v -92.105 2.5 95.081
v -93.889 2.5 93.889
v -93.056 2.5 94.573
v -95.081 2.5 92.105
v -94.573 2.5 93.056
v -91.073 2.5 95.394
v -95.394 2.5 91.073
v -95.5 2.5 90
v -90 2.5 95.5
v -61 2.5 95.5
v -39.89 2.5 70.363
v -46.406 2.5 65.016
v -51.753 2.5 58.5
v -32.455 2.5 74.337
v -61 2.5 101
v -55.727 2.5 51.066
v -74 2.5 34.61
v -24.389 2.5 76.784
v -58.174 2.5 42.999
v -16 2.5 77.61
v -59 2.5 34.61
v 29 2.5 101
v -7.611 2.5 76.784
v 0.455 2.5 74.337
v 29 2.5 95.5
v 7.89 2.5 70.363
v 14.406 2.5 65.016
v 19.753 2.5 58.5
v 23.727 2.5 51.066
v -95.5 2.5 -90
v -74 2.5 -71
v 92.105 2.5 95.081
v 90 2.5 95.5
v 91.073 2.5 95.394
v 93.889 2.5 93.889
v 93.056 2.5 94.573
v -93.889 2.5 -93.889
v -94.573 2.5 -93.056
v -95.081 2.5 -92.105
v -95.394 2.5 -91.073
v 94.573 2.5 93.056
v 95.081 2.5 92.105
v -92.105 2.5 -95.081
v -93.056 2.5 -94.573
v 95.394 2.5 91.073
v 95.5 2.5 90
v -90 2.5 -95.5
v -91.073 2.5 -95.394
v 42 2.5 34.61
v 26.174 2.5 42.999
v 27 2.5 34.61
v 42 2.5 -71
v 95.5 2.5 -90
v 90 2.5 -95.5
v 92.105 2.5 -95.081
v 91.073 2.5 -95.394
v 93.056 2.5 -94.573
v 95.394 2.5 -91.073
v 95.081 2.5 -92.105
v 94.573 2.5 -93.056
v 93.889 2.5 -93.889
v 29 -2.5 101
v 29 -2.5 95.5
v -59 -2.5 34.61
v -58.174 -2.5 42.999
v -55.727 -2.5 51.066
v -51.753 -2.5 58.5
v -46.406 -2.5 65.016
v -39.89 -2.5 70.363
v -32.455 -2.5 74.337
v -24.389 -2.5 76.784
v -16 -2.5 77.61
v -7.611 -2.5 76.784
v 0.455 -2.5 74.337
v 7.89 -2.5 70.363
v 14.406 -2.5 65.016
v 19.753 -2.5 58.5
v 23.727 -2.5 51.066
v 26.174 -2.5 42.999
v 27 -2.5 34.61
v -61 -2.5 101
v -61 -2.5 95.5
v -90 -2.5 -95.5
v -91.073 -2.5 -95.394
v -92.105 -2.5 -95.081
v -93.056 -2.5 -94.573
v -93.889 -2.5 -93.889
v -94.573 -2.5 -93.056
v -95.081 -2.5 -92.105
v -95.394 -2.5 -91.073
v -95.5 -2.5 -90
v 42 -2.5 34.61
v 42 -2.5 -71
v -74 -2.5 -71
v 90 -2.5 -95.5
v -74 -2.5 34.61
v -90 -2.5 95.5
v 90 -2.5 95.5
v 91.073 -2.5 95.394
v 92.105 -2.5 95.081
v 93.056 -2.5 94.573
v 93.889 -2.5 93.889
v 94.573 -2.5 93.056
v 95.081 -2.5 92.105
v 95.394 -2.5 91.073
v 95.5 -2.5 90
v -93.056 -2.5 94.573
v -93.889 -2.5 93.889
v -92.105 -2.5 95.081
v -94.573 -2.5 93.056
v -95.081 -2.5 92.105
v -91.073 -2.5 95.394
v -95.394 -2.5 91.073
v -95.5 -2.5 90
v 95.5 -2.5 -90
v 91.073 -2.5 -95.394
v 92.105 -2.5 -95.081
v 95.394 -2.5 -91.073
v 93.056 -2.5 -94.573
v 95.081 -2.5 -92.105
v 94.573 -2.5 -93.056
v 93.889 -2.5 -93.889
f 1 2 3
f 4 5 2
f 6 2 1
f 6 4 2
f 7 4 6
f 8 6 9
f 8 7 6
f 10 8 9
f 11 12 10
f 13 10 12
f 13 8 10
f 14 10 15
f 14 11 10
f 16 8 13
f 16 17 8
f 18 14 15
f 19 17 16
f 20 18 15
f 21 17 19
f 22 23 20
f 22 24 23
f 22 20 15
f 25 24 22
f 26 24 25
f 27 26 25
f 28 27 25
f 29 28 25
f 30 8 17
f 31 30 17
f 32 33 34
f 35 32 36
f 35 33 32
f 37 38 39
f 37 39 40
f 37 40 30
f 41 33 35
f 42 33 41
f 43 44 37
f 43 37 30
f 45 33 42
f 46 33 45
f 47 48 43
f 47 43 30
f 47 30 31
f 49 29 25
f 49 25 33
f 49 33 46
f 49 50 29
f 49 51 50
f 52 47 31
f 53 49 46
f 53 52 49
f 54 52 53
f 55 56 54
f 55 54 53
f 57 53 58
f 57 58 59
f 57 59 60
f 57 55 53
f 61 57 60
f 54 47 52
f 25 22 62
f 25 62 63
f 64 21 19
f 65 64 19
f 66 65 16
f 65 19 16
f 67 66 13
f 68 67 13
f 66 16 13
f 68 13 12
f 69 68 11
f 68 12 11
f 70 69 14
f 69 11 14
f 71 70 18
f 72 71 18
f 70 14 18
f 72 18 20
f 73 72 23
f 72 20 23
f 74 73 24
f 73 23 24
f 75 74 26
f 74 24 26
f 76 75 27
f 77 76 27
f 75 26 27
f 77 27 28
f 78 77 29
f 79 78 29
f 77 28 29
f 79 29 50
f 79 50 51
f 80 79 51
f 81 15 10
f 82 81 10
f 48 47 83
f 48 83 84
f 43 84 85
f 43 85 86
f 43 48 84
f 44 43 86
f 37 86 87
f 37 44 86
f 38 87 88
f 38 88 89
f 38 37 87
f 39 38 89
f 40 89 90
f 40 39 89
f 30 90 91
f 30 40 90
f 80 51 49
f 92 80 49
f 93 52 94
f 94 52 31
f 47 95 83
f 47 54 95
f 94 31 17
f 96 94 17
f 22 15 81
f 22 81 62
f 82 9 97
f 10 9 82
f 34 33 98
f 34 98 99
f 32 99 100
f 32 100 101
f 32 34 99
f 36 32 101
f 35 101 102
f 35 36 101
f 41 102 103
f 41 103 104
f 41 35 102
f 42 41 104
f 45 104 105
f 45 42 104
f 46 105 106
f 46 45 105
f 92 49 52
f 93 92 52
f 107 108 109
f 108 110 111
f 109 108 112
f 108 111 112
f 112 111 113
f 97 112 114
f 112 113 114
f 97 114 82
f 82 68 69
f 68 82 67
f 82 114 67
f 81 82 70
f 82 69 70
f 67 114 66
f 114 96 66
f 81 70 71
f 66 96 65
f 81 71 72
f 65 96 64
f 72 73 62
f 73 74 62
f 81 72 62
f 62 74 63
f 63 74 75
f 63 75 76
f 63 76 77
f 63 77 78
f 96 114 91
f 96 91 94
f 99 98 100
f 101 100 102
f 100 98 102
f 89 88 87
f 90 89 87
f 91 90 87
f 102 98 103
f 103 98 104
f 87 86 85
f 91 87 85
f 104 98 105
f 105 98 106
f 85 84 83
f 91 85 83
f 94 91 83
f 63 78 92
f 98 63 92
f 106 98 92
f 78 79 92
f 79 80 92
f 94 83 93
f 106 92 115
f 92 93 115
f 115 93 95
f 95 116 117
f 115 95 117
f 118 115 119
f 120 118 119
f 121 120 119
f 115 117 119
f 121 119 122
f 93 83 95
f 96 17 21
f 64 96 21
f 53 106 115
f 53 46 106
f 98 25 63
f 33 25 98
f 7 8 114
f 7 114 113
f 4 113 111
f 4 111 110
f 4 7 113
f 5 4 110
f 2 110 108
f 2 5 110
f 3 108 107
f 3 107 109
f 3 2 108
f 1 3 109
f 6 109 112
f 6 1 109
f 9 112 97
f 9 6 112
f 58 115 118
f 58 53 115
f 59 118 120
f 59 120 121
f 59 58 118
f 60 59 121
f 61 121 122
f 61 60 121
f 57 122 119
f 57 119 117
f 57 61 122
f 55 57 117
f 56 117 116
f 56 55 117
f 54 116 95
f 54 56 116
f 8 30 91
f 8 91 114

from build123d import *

# Parameters (mm, degrees)
BOSS_EXTRUDE1_DEPTH = 2.5
CUT_EXTRUDE1_DEPTH  = 6
SKETCH3_W           = 90
SKETCH3_H           = 5.5
BOSS_EXTRUDE2_DEPTH = 5


with BuildPart() as part:
    # Sketch1 → Boss-Extrude1 (new body, symmetric)
    with BuildSketch(Plane(origin=(0, 0, 0), x_dir=(1, 0, 0), z_dir=(0, 1, 0))):
        with BuildLine():
            Line((90, 95.5), (-90, 95.5))
            ThreePointArc((-90, 95.5), (-93.889087297, 93.889087297), (-95.5, 90))
            Line((-95.5, 90), (-95.5, -90))
            ThreePointArc((-95.5, -90), (-93.889087297, -93.889087297), (-90, -95.5))
            Line((-90, -95.5), (90, -95.5))
            ThreePointArc((90, -95.5), (93.889087297, -93.889087297), (95.5, -90))
            Line((95.5, -90), (95.5, 90))
            ThreePointArc((95.5, 90), (93.889087297, 93.889087297), (90, 95.5))
        make_face()
    extrude(amount=BOSS_EXTRUDE1_DEPTH, both=True)

    # Sketch2 → Cut-Extrude1 (cut, through all)
    with BuildSketch(Plane(origin=(0, 2.5, 0), x_dir=(1, 0, 0), z_dir=(0, 1, 0))):
        with BuildLine():
            Line((42, 71), (-74, 71))
            Line((-74, 71), (-74, -34.610229671))
            Line((-74, -34.610229671), (-59, -34.610229671))
            ThreePointArc((-59, -34.610229671), (-16, -77.610229671), (27, -34.610229671))
            Line((27, -34.610229671), (42, -34.610229671))
            Line((42, -34.610229671), (42, 71))
        make_face()
    extrude(amount=-CUT_EXTRUDE1_DEPTH, mode=Mode.SUBTRACT)

    # Sketch3 → Boss-Extrude2 (add)
    with BuildSketch(Plane(origin=(0, 2.5, 0), x_dir=(1, 0, 0), z_dir=(0, 1, 0))):
        with Locations((-16, -98.25)):
            Rectangle(SKETCH3_W, SKETCH3_H)
    extrude(amount=-BOSS_EXTRUDE2_DEPTH)


solid = part.part
